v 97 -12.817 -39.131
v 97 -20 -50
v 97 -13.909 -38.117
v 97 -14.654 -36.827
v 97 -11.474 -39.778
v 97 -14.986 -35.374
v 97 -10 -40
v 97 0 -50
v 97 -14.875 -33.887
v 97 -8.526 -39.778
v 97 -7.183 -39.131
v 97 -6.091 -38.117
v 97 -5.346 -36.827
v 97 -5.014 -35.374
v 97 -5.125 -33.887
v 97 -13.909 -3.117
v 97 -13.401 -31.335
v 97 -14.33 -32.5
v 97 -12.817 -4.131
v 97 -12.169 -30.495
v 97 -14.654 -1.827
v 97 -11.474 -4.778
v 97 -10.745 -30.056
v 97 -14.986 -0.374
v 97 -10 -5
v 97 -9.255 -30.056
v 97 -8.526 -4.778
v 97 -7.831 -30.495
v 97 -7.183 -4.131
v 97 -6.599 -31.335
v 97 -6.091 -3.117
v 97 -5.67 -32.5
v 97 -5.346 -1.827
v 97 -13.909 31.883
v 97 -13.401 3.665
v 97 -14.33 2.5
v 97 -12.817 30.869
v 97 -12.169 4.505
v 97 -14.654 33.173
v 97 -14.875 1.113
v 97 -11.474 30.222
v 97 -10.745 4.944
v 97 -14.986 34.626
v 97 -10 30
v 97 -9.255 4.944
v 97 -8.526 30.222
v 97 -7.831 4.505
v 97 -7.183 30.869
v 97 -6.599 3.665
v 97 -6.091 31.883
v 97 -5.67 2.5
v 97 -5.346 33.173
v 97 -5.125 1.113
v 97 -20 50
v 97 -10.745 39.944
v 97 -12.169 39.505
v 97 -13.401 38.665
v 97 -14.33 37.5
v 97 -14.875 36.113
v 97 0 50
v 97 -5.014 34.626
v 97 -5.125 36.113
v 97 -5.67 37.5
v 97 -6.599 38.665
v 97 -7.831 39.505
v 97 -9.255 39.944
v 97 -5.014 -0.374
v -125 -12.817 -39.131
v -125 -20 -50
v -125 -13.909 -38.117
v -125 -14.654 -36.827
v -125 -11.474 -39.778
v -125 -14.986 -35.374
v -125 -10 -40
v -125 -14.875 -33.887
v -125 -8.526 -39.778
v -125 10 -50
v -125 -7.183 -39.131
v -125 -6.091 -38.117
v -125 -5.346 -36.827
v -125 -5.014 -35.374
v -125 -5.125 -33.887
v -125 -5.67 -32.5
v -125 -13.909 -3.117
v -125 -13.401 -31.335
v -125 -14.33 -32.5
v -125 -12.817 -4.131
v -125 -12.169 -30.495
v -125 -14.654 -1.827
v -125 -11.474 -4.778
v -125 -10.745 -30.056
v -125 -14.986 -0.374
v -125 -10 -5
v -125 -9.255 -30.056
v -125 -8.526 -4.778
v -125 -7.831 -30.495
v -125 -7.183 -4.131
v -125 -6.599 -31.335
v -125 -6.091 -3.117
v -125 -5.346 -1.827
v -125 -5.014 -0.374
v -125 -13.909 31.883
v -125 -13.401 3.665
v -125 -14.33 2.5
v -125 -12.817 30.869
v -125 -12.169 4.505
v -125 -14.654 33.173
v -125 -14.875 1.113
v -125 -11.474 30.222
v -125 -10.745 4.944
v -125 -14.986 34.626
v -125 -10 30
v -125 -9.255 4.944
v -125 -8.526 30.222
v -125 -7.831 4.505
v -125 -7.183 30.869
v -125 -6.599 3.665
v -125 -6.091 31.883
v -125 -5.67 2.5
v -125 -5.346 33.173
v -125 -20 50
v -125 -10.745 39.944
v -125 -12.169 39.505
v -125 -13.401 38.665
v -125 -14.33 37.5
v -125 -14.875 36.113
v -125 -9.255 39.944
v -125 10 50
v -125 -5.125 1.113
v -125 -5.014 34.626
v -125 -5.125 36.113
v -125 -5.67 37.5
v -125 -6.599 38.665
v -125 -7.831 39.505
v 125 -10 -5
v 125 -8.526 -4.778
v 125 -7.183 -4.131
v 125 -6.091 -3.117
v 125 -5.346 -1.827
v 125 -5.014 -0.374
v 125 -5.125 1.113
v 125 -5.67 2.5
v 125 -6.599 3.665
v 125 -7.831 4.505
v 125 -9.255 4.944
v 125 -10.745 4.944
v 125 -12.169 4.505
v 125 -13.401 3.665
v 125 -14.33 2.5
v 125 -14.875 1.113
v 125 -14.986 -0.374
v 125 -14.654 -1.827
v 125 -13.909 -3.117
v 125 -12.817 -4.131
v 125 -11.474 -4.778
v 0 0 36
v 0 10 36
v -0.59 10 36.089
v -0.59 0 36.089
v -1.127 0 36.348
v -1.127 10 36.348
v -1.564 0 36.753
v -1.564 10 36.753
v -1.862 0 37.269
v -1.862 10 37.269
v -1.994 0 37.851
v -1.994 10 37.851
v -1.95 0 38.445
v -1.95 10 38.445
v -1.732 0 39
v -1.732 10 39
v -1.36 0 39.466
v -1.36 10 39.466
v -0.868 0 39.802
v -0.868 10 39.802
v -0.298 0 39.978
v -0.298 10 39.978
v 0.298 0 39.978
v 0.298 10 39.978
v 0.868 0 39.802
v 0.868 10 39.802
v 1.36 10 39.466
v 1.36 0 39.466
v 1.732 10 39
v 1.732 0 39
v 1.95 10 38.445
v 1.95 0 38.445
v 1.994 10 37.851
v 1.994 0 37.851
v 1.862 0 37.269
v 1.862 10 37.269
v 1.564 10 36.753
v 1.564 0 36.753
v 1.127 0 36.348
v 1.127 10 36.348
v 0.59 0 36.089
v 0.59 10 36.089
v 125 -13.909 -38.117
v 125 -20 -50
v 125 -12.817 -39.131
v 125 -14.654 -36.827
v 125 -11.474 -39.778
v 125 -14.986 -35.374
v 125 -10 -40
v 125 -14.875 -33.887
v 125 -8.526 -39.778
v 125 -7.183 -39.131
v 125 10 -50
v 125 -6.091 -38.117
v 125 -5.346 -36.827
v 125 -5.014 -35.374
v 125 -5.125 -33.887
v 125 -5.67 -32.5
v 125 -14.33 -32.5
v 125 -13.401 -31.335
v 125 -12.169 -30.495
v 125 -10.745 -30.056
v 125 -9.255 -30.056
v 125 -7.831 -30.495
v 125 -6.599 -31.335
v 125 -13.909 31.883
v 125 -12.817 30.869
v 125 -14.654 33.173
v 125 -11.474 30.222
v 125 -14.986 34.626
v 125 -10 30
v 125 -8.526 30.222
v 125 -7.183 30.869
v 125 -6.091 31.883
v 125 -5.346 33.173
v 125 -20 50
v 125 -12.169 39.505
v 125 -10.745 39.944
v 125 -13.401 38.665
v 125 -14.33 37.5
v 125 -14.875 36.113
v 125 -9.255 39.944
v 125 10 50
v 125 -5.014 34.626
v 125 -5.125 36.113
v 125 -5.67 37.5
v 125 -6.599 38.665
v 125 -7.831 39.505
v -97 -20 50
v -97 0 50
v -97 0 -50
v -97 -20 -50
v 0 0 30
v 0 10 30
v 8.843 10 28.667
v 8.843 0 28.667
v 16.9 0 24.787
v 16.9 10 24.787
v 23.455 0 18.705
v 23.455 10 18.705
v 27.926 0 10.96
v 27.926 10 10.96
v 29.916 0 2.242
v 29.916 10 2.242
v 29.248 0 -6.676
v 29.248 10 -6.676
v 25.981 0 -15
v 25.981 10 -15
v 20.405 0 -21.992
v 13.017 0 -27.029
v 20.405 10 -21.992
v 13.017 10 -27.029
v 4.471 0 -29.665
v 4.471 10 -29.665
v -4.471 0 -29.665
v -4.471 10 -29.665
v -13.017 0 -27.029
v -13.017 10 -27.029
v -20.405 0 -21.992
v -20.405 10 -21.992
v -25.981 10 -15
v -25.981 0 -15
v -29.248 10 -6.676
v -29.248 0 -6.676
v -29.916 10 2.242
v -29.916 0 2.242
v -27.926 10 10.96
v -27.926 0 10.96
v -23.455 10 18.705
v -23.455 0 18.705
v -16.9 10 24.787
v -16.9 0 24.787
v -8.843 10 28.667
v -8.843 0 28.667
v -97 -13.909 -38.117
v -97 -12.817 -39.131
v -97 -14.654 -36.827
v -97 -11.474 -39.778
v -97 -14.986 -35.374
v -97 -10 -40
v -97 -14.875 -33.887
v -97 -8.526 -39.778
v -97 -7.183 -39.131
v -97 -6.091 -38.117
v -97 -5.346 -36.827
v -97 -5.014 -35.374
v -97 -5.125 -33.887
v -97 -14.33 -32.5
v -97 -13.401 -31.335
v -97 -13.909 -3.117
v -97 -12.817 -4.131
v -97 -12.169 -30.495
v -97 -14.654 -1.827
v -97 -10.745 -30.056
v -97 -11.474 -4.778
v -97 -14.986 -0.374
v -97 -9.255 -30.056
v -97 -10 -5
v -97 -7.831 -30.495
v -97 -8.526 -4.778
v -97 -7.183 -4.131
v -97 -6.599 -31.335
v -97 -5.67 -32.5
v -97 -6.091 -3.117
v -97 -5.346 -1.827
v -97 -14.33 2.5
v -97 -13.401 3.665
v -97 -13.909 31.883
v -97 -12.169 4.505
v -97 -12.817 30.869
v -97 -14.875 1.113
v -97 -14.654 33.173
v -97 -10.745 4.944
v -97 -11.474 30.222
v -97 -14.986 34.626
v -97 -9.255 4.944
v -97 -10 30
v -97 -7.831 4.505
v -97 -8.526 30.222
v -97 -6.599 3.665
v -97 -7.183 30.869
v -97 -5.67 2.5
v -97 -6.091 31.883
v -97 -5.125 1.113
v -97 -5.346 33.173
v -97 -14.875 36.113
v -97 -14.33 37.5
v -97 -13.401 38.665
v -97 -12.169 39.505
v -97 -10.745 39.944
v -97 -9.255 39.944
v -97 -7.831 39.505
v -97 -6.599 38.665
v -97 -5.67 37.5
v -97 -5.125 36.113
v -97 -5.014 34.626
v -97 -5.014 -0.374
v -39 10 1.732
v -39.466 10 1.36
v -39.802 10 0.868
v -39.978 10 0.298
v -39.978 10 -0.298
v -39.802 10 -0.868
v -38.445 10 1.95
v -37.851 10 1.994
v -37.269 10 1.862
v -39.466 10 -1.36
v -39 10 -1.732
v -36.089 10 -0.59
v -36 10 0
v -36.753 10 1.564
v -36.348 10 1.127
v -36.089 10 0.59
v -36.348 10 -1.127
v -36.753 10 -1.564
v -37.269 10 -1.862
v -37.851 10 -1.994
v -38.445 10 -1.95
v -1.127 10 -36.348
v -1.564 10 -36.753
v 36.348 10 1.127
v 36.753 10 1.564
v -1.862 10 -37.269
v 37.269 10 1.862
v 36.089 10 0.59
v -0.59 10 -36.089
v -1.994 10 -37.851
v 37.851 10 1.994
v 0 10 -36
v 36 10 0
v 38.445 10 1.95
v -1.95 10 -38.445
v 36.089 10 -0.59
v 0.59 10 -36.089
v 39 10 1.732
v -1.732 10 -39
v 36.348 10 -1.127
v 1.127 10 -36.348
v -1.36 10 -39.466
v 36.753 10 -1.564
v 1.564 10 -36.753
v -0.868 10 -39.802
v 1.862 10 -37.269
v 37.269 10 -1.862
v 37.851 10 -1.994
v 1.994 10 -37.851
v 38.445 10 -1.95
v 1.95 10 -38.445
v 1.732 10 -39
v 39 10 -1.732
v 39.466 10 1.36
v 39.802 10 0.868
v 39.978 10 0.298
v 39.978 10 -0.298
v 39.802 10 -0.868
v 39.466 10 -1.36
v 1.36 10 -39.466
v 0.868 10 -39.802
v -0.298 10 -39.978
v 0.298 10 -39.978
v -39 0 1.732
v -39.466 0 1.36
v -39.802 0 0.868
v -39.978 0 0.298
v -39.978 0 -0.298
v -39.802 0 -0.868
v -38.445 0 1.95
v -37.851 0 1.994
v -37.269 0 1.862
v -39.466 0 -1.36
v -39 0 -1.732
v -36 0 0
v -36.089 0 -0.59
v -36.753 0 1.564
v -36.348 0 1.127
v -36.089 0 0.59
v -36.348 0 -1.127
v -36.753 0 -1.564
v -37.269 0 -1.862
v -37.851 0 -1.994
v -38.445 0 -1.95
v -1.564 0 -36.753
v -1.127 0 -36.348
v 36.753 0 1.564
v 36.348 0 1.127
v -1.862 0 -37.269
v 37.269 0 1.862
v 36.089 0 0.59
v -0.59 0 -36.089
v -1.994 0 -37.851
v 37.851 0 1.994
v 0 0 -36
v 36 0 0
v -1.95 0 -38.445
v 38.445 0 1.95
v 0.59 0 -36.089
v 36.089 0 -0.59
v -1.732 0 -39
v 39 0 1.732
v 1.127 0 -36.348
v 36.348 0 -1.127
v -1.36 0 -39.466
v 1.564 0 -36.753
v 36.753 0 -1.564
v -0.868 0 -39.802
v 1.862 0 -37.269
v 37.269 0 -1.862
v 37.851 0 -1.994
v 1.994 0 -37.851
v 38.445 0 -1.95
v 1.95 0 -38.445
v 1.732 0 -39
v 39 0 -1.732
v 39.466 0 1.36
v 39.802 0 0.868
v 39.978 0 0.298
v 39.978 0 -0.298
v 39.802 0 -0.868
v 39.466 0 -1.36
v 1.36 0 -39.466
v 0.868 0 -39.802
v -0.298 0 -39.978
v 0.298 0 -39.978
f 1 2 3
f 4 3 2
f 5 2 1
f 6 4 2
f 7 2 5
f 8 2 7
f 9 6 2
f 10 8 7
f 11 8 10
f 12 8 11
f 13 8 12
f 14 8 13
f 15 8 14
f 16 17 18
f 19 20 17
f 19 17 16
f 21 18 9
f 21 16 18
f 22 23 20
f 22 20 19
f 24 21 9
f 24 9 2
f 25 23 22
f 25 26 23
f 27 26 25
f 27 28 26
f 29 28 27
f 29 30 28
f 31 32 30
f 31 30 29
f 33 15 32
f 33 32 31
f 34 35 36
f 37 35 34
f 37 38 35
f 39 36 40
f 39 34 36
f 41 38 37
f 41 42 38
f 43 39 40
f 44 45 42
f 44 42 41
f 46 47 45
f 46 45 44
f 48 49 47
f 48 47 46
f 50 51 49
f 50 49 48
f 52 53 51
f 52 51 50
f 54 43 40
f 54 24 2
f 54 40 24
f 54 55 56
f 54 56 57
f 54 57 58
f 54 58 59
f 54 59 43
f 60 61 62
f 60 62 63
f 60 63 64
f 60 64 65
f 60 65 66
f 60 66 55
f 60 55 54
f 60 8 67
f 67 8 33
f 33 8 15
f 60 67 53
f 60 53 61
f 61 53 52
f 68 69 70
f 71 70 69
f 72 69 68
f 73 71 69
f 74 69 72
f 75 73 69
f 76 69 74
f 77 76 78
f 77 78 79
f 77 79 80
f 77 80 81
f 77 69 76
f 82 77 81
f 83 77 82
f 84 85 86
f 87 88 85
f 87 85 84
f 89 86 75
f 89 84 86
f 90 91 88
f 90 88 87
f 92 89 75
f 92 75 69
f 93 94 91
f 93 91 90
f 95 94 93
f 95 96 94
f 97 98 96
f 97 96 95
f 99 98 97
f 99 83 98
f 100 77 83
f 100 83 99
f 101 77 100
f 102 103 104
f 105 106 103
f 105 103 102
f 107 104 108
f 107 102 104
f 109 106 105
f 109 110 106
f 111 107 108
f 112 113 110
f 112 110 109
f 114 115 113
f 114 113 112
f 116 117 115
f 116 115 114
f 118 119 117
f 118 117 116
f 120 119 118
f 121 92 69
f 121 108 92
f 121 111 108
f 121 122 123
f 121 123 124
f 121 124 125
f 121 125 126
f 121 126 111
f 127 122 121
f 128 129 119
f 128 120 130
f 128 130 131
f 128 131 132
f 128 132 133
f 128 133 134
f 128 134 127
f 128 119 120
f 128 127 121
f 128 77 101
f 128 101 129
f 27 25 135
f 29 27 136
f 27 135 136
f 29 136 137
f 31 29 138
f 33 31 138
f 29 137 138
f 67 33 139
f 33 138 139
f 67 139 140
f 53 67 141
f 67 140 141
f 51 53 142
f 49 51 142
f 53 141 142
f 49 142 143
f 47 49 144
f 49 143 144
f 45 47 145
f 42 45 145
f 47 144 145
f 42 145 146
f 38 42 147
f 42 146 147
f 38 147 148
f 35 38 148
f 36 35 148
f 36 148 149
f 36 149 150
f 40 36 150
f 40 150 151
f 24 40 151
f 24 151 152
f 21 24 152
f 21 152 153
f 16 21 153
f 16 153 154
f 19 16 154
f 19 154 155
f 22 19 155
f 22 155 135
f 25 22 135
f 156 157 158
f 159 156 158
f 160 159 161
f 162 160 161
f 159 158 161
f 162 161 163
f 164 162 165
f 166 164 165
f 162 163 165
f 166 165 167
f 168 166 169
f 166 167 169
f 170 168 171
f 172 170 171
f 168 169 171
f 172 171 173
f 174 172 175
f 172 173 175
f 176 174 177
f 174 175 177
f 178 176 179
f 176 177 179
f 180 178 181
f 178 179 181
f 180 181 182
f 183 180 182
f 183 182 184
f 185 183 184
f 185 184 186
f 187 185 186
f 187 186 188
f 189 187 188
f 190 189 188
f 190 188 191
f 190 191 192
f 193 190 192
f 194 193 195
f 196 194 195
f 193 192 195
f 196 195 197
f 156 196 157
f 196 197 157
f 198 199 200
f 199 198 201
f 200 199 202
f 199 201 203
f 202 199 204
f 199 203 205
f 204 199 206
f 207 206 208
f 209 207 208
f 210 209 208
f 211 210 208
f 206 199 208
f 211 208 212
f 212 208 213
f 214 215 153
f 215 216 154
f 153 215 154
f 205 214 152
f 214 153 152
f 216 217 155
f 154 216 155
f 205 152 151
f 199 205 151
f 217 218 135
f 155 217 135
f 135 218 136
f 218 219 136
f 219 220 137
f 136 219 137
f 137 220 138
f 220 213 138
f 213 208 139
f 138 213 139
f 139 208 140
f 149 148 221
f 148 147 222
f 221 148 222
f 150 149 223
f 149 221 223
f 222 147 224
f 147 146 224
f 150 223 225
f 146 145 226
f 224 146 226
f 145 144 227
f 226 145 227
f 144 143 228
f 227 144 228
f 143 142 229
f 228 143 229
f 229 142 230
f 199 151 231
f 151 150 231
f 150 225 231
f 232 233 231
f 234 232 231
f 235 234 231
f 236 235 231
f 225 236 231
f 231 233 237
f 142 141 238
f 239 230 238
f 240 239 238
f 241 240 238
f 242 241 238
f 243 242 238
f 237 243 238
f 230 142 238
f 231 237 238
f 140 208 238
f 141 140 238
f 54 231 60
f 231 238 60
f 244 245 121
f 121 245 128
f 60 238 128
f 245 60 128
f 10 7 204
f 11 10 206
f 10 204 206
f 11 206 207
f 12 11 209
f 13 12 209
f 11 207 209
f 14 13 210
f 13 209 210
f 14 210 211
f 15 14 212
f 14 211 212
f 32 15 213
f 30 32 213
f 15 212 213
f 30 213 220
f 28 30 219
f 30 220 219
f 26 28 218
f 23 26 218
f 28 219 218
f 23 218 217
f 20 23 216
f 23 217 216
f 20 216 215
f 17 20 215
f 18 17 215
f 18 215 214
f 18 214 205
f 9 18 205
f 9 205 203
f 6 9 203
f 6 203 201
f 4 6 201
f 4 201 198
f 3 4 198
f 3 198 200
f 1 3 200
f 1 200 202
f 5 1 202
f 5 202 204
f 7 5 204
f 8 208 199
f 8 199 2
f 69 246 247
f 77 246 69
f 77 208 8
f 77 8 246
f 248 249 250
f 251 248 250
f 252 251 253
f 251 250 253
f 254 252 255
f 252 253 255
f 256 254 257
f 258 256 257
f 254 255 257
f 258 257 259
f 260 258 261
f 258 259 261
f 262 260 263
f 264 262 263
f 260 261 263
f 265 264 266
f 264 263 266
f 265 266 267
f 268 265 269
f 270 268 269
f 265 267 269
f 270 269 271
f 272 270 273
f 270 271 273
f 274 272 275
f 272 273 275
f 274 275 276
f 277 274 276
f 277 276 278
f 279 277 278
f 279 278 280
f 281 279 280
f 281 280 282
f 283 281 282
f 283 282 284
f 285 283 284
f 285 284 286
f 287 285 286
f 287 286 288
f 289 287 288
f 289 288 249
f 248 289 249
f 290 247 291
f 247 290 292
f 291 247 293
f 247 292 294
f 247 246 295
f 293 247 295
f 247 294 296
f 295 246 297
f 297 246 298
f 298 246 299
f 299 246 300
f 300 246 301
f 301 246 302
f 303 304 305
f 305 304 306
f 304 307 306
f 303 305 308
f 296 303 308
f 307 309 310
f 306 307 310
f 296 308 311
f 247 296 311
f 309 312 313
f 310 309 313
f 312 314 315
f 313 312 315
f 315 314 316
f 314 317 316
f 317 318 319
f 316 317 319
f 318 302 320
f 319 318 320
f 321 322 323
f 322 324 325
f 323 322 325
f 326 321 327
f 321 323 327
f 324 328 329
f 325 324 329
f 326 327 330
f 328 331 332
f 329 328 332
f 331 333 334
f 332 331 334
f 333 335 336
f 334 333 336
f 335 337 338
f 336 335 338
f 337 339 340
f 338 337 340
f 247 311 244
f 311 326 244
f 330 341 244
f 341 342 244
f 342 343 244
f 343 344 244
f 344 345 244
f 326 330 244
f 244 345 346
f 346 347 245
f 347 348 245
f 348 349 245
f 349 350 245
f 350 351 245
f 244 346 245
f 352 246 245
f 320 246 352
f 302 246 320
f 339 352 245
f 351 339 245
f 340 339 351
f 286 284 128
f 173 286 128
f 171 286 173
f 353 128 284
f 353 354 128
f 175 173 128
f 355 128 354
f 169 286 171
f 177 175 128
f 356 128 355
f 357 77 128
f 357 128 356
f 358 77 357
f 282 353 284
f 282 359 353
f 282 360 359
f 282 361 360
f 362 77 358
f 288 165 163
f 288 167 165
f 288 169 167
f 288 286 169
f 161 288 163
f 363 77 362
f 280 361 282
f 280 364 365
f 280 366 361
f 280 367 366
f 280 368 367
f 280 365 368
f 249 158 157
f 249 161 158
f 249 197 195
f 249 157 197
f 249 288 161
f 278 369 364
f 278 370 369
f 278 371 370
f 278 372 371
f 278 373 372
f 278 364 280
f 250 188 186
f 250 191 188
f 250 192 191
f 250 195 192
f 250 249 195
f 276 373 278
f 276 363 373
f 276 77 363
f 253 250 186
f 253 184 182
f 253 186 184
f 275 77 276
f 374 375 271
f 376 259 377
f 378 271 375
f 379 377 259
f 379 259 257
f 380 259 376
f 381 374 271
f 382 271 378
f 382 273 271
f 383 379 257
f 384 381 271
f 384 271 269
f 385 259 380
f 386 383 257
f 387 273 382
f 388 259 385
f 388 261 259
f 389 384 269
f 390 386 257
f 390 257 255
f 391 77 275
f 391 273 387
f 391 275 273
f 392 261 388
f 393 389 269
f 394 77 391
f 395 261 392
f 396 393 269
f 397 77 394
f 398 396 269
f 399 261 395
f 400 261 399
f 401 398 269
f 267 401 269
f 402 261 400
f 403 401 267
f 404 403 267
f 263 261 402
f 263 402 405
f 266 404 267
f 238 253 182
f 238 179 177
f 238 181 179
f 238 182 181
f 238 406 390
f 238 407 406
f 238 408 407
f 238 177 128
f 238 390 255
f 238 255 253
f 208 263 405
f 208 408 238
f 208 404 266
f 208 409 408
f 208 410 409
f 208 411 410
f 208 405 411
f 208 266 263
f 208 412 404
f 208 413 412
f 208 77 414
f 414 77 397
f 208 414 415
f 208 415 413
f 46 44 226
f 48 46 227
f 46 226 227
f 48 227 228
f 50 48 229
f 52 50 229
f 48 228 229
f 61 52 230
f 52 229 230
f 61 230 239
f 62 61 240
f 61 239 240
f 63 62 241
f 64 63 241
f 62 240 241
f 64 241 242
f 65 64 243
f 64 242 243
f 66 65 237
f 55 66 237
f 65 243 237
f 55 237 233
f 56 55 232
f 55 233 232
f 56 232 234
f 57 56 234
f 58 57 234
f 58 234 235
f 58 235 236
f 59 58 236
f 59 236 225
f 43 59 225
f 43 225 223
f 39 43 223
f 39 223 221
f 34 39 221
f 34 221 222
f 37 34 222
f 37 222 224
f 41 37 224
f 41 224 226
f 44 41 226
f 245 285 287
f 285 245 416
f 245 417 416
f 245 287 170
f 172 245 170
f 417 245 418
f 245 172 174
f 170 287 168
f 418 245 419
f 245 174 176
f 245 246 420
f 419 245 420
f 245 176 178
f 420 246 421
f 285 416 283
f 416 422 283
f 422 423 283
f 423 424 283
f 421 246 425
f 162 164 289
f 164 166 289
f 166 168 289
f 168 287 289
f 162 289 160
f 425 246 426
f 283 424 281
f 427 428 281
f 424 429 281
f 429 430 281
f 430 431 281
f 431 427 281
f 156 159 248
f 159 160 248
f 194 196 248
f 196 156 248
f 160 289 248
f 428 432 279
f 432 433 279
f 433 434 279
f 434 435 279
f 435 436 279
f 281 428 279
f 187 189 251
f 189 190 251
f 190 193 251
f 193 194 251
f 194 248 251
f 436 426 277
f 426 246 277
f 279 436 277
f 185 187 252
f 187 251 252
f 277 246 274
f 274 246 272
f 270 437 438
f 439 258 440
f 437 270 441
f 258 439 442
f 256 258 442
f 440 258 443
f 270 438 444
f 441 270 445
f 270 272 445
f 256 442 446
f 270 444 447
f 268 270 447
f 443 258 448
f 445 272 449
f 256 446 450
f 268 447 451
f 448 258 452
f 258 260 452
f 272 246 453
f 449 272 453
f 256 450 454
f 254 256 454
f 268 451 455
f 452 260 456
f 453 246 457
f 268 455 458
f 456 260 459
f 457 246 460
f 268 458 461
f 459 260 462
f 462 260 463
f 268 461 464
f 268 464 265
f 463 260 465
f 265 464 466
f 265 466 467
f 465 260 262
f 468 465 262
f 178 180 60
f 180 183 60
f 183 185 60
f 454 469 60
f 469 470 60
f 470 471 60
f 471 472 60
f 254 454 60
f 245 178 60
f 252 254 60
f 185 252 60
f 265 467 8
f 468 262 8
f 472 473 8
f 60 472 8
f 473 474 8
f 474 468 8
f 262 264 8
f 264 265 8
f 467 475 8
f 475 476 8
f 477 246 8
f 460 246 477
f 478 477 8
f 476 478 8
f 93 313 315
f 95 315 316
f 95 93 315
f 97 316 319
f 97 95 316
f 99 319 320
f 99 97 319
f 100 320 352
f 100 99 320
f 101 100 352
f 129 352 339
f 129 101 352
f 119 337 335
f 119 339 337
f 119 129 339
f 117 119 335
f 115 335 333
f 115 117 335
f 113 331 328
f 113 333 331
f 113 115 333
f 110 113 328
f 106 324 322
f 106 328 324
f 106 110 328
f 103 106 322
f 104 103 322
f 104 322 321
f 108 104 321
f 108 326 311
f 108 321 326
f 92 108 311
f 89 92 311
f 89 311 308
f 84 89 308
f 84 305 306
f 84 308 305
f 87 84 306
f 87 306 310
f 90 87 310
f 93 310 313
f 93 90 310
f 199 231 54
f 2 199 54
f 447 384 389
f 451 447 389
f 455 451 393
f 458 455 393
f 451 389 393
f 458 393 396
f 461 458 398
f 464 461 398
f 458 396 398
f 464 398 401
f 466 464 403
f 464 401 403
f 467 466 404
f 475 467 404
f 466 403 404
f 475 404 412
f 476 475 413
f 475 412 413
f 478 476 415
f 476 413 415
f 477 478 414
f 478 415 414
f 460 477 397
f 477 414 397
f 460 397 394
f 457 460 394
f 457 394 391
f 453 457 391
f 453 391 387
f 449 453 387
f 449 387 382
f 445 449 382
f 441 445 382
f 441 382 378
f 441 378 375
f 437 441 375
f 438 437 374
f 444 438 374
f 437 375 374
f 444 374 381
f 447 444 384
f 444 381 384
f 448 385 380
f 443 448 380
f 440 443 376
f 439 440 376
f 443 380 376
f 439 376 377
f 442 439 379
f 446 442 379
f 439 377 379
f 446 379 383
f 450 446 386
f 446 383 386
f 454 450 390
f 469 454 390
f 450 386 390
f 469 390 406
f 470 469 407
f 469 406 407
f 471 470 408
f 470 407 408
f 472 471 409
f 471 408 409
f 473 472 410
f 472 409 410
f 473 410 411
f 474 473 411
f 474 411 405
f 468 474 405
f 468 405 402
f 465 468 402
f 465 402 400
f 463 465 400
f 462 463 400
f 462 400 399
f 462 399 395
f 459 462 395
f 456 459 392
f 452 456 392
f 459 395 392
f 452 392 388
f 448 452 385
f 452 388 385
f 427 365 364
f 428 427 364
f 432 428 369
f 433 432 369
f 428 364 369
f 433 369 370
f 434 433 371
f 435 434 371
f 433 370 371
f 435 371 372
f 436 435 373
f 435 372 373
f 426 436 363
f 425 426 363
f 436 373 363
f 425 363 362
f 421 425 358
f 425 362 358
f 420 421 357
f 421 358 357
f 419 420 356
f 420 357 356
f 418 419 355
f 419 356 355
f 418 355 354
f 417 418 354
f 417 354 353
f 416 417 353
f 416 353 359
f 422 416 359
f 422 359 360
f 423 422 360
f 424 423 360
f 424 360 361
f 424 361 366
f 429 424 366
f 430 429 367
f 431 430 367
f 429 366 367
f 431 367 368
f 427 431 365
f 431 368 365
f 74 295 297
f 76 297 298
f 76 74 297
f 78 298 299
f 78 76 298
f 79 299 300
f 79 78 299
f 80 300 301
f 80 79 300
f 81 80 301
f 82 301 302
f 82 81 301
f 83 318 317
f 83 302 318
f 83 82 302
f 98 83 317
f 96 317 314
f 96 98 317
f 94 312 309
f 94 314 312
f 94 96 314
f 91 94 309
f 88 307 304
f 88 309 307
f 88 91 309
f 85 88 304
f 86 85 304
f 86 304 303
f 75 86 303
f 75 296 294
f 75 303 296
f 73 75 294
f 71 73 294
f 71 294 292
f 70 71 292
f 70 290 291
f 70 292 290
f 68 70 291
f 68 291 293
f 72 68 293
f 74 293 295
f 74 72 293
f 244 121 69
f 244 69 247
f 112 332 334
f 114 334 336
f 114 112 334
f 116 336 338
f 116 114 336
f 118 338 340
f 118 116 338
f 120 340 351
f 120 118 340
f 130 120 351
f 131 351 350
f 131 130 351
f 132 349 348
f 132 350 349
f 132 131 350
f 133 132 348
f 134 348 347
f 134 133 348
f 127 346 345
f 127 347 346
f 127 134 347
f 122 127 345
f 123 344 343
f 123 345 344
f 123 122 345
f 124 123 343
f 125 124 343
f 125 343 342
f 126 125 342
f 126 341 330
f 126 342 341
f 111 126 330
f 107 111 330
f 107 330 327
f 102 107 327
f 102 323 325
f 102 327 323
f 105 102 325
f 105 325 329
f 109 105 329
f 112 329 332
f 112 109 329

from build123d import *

# Parameters (mm, degrees)
EXTRUDE_1_DEPTH          = 10
SKETCH_2_R               = 30
CUT_EXTRUDE_1_DEPTH      = 15
SKETCH_4_W               = 28
SKETCH_4_H               = 100
EXTRUDE_2_DEPTH          = 20
SKETCH_5_R               = 5
CUT_EXTRUDE_2_DEPTH      = 30
SKETCH_6_R               = 2
CUT_EXTRUDE_4_DEPTH      = 10
PATTERN_CIRCULAR_1_COUNT = 4


with BuildPart() as part:
    # 草图1 → 凸台-拉伸1 (new body)
    with BuildSketch(Plane(origin=(0, 0, 0), x_dir=(1, 0, 0), z_dir=(0, 1, 0))):
        Polygon((0, -50), (125, -50), (125, 50), (-125, 50), (-125, -50), align=None)
    extrude(amount=EXTRUDE_1_DEPTH)

    # 草图2 → 切除-拉伸1 (cut)
    with BuildSketch(Plane(origin=(0, 10, 0), x_dir=(1, 0, 0), z_dir=(0, 1, 0))):
        with Locations(Location((0, 0, 0), (0, 0, 270))):
            Circle(SKETCH_2_R)
    extrude(amount=-CUT_EXTRUDE_1_DEPTH, mode=Mode.SUBTRACT)

    # 草图4 → 凸台-拉伸2 (add)
    with BuildSketch(Plane.XZ):
        with Locations((-111, 0)):
            Rectangle(SKETCH_4_W, SKETCH_4_H)
    extrude_2 = extrude(amount=EXTRUDE_2_DEPTH)

    # 镜向1: 凸台-拉伸2 across plane
    add(extrude_2.mirror(Plane(origin=(0, 0, 0), x_dir=(0, 0, 1), z_dir=(1, 0, 0))))

    # 草图5 → 切除-拉伸2 (cut)
    with BuildSketch(Plane(origin=(125, 0, 0), x_dir=(0, 0, -1), z_dir=(1, 0, 0))):
        with Locations((0, -10)):
            Circle(SKETCH_5_R)
        with Locations((35, -10)):
            Circle(SKETCH_5_R)
        with Locations((-35, -10)):
            Circle(SKETCH_5_R)
    cut_extrude_2 = extrude(amount=-CUT_EXTRUDE_2_DEPTH, mode=Mode.SUBTRACT)

    # 镜向2: 切除-拉伸2 across plane
    add(cut_extrude_2.mirror(Plane(origin=(0, 0, 0), x_dir=(0, 0, 1), z_dir=(1, 0, 0))), mode=Mode.SUBTRACT)

    # 草图6 → 切除-拉伸4 (cut)
    with BuildSketch(Plane(origin=(0, 10, 0), x_dir=(1, 0, 0), z_dir=(0, 1, 0))):
        with Locations(Location((0, 38, 0), (0, 0, 270))):
            Circle(SKETCH_6_R)
    cut_extrude_4 = extrude(amount=-CUT_EXTRUDE_4_DEPTH, mode=Mode.SUBTRACT)

    # 阵列(圆周)1: 切除-拉伸4 ×4 about axis
    pattern_circular_1_axis = Axis((0, 0, 0), (0, 1, 0))
    for i in range(1, PATTERN_CIRCULAR_1_COUNT):
        add(cut_extrude_4.rotate(pattern_circular_1_axis, i * 360 / PATTERN_CIRCULAR_1_COUNT), mode=Mode.SUBTRACT)


solid = part.part
